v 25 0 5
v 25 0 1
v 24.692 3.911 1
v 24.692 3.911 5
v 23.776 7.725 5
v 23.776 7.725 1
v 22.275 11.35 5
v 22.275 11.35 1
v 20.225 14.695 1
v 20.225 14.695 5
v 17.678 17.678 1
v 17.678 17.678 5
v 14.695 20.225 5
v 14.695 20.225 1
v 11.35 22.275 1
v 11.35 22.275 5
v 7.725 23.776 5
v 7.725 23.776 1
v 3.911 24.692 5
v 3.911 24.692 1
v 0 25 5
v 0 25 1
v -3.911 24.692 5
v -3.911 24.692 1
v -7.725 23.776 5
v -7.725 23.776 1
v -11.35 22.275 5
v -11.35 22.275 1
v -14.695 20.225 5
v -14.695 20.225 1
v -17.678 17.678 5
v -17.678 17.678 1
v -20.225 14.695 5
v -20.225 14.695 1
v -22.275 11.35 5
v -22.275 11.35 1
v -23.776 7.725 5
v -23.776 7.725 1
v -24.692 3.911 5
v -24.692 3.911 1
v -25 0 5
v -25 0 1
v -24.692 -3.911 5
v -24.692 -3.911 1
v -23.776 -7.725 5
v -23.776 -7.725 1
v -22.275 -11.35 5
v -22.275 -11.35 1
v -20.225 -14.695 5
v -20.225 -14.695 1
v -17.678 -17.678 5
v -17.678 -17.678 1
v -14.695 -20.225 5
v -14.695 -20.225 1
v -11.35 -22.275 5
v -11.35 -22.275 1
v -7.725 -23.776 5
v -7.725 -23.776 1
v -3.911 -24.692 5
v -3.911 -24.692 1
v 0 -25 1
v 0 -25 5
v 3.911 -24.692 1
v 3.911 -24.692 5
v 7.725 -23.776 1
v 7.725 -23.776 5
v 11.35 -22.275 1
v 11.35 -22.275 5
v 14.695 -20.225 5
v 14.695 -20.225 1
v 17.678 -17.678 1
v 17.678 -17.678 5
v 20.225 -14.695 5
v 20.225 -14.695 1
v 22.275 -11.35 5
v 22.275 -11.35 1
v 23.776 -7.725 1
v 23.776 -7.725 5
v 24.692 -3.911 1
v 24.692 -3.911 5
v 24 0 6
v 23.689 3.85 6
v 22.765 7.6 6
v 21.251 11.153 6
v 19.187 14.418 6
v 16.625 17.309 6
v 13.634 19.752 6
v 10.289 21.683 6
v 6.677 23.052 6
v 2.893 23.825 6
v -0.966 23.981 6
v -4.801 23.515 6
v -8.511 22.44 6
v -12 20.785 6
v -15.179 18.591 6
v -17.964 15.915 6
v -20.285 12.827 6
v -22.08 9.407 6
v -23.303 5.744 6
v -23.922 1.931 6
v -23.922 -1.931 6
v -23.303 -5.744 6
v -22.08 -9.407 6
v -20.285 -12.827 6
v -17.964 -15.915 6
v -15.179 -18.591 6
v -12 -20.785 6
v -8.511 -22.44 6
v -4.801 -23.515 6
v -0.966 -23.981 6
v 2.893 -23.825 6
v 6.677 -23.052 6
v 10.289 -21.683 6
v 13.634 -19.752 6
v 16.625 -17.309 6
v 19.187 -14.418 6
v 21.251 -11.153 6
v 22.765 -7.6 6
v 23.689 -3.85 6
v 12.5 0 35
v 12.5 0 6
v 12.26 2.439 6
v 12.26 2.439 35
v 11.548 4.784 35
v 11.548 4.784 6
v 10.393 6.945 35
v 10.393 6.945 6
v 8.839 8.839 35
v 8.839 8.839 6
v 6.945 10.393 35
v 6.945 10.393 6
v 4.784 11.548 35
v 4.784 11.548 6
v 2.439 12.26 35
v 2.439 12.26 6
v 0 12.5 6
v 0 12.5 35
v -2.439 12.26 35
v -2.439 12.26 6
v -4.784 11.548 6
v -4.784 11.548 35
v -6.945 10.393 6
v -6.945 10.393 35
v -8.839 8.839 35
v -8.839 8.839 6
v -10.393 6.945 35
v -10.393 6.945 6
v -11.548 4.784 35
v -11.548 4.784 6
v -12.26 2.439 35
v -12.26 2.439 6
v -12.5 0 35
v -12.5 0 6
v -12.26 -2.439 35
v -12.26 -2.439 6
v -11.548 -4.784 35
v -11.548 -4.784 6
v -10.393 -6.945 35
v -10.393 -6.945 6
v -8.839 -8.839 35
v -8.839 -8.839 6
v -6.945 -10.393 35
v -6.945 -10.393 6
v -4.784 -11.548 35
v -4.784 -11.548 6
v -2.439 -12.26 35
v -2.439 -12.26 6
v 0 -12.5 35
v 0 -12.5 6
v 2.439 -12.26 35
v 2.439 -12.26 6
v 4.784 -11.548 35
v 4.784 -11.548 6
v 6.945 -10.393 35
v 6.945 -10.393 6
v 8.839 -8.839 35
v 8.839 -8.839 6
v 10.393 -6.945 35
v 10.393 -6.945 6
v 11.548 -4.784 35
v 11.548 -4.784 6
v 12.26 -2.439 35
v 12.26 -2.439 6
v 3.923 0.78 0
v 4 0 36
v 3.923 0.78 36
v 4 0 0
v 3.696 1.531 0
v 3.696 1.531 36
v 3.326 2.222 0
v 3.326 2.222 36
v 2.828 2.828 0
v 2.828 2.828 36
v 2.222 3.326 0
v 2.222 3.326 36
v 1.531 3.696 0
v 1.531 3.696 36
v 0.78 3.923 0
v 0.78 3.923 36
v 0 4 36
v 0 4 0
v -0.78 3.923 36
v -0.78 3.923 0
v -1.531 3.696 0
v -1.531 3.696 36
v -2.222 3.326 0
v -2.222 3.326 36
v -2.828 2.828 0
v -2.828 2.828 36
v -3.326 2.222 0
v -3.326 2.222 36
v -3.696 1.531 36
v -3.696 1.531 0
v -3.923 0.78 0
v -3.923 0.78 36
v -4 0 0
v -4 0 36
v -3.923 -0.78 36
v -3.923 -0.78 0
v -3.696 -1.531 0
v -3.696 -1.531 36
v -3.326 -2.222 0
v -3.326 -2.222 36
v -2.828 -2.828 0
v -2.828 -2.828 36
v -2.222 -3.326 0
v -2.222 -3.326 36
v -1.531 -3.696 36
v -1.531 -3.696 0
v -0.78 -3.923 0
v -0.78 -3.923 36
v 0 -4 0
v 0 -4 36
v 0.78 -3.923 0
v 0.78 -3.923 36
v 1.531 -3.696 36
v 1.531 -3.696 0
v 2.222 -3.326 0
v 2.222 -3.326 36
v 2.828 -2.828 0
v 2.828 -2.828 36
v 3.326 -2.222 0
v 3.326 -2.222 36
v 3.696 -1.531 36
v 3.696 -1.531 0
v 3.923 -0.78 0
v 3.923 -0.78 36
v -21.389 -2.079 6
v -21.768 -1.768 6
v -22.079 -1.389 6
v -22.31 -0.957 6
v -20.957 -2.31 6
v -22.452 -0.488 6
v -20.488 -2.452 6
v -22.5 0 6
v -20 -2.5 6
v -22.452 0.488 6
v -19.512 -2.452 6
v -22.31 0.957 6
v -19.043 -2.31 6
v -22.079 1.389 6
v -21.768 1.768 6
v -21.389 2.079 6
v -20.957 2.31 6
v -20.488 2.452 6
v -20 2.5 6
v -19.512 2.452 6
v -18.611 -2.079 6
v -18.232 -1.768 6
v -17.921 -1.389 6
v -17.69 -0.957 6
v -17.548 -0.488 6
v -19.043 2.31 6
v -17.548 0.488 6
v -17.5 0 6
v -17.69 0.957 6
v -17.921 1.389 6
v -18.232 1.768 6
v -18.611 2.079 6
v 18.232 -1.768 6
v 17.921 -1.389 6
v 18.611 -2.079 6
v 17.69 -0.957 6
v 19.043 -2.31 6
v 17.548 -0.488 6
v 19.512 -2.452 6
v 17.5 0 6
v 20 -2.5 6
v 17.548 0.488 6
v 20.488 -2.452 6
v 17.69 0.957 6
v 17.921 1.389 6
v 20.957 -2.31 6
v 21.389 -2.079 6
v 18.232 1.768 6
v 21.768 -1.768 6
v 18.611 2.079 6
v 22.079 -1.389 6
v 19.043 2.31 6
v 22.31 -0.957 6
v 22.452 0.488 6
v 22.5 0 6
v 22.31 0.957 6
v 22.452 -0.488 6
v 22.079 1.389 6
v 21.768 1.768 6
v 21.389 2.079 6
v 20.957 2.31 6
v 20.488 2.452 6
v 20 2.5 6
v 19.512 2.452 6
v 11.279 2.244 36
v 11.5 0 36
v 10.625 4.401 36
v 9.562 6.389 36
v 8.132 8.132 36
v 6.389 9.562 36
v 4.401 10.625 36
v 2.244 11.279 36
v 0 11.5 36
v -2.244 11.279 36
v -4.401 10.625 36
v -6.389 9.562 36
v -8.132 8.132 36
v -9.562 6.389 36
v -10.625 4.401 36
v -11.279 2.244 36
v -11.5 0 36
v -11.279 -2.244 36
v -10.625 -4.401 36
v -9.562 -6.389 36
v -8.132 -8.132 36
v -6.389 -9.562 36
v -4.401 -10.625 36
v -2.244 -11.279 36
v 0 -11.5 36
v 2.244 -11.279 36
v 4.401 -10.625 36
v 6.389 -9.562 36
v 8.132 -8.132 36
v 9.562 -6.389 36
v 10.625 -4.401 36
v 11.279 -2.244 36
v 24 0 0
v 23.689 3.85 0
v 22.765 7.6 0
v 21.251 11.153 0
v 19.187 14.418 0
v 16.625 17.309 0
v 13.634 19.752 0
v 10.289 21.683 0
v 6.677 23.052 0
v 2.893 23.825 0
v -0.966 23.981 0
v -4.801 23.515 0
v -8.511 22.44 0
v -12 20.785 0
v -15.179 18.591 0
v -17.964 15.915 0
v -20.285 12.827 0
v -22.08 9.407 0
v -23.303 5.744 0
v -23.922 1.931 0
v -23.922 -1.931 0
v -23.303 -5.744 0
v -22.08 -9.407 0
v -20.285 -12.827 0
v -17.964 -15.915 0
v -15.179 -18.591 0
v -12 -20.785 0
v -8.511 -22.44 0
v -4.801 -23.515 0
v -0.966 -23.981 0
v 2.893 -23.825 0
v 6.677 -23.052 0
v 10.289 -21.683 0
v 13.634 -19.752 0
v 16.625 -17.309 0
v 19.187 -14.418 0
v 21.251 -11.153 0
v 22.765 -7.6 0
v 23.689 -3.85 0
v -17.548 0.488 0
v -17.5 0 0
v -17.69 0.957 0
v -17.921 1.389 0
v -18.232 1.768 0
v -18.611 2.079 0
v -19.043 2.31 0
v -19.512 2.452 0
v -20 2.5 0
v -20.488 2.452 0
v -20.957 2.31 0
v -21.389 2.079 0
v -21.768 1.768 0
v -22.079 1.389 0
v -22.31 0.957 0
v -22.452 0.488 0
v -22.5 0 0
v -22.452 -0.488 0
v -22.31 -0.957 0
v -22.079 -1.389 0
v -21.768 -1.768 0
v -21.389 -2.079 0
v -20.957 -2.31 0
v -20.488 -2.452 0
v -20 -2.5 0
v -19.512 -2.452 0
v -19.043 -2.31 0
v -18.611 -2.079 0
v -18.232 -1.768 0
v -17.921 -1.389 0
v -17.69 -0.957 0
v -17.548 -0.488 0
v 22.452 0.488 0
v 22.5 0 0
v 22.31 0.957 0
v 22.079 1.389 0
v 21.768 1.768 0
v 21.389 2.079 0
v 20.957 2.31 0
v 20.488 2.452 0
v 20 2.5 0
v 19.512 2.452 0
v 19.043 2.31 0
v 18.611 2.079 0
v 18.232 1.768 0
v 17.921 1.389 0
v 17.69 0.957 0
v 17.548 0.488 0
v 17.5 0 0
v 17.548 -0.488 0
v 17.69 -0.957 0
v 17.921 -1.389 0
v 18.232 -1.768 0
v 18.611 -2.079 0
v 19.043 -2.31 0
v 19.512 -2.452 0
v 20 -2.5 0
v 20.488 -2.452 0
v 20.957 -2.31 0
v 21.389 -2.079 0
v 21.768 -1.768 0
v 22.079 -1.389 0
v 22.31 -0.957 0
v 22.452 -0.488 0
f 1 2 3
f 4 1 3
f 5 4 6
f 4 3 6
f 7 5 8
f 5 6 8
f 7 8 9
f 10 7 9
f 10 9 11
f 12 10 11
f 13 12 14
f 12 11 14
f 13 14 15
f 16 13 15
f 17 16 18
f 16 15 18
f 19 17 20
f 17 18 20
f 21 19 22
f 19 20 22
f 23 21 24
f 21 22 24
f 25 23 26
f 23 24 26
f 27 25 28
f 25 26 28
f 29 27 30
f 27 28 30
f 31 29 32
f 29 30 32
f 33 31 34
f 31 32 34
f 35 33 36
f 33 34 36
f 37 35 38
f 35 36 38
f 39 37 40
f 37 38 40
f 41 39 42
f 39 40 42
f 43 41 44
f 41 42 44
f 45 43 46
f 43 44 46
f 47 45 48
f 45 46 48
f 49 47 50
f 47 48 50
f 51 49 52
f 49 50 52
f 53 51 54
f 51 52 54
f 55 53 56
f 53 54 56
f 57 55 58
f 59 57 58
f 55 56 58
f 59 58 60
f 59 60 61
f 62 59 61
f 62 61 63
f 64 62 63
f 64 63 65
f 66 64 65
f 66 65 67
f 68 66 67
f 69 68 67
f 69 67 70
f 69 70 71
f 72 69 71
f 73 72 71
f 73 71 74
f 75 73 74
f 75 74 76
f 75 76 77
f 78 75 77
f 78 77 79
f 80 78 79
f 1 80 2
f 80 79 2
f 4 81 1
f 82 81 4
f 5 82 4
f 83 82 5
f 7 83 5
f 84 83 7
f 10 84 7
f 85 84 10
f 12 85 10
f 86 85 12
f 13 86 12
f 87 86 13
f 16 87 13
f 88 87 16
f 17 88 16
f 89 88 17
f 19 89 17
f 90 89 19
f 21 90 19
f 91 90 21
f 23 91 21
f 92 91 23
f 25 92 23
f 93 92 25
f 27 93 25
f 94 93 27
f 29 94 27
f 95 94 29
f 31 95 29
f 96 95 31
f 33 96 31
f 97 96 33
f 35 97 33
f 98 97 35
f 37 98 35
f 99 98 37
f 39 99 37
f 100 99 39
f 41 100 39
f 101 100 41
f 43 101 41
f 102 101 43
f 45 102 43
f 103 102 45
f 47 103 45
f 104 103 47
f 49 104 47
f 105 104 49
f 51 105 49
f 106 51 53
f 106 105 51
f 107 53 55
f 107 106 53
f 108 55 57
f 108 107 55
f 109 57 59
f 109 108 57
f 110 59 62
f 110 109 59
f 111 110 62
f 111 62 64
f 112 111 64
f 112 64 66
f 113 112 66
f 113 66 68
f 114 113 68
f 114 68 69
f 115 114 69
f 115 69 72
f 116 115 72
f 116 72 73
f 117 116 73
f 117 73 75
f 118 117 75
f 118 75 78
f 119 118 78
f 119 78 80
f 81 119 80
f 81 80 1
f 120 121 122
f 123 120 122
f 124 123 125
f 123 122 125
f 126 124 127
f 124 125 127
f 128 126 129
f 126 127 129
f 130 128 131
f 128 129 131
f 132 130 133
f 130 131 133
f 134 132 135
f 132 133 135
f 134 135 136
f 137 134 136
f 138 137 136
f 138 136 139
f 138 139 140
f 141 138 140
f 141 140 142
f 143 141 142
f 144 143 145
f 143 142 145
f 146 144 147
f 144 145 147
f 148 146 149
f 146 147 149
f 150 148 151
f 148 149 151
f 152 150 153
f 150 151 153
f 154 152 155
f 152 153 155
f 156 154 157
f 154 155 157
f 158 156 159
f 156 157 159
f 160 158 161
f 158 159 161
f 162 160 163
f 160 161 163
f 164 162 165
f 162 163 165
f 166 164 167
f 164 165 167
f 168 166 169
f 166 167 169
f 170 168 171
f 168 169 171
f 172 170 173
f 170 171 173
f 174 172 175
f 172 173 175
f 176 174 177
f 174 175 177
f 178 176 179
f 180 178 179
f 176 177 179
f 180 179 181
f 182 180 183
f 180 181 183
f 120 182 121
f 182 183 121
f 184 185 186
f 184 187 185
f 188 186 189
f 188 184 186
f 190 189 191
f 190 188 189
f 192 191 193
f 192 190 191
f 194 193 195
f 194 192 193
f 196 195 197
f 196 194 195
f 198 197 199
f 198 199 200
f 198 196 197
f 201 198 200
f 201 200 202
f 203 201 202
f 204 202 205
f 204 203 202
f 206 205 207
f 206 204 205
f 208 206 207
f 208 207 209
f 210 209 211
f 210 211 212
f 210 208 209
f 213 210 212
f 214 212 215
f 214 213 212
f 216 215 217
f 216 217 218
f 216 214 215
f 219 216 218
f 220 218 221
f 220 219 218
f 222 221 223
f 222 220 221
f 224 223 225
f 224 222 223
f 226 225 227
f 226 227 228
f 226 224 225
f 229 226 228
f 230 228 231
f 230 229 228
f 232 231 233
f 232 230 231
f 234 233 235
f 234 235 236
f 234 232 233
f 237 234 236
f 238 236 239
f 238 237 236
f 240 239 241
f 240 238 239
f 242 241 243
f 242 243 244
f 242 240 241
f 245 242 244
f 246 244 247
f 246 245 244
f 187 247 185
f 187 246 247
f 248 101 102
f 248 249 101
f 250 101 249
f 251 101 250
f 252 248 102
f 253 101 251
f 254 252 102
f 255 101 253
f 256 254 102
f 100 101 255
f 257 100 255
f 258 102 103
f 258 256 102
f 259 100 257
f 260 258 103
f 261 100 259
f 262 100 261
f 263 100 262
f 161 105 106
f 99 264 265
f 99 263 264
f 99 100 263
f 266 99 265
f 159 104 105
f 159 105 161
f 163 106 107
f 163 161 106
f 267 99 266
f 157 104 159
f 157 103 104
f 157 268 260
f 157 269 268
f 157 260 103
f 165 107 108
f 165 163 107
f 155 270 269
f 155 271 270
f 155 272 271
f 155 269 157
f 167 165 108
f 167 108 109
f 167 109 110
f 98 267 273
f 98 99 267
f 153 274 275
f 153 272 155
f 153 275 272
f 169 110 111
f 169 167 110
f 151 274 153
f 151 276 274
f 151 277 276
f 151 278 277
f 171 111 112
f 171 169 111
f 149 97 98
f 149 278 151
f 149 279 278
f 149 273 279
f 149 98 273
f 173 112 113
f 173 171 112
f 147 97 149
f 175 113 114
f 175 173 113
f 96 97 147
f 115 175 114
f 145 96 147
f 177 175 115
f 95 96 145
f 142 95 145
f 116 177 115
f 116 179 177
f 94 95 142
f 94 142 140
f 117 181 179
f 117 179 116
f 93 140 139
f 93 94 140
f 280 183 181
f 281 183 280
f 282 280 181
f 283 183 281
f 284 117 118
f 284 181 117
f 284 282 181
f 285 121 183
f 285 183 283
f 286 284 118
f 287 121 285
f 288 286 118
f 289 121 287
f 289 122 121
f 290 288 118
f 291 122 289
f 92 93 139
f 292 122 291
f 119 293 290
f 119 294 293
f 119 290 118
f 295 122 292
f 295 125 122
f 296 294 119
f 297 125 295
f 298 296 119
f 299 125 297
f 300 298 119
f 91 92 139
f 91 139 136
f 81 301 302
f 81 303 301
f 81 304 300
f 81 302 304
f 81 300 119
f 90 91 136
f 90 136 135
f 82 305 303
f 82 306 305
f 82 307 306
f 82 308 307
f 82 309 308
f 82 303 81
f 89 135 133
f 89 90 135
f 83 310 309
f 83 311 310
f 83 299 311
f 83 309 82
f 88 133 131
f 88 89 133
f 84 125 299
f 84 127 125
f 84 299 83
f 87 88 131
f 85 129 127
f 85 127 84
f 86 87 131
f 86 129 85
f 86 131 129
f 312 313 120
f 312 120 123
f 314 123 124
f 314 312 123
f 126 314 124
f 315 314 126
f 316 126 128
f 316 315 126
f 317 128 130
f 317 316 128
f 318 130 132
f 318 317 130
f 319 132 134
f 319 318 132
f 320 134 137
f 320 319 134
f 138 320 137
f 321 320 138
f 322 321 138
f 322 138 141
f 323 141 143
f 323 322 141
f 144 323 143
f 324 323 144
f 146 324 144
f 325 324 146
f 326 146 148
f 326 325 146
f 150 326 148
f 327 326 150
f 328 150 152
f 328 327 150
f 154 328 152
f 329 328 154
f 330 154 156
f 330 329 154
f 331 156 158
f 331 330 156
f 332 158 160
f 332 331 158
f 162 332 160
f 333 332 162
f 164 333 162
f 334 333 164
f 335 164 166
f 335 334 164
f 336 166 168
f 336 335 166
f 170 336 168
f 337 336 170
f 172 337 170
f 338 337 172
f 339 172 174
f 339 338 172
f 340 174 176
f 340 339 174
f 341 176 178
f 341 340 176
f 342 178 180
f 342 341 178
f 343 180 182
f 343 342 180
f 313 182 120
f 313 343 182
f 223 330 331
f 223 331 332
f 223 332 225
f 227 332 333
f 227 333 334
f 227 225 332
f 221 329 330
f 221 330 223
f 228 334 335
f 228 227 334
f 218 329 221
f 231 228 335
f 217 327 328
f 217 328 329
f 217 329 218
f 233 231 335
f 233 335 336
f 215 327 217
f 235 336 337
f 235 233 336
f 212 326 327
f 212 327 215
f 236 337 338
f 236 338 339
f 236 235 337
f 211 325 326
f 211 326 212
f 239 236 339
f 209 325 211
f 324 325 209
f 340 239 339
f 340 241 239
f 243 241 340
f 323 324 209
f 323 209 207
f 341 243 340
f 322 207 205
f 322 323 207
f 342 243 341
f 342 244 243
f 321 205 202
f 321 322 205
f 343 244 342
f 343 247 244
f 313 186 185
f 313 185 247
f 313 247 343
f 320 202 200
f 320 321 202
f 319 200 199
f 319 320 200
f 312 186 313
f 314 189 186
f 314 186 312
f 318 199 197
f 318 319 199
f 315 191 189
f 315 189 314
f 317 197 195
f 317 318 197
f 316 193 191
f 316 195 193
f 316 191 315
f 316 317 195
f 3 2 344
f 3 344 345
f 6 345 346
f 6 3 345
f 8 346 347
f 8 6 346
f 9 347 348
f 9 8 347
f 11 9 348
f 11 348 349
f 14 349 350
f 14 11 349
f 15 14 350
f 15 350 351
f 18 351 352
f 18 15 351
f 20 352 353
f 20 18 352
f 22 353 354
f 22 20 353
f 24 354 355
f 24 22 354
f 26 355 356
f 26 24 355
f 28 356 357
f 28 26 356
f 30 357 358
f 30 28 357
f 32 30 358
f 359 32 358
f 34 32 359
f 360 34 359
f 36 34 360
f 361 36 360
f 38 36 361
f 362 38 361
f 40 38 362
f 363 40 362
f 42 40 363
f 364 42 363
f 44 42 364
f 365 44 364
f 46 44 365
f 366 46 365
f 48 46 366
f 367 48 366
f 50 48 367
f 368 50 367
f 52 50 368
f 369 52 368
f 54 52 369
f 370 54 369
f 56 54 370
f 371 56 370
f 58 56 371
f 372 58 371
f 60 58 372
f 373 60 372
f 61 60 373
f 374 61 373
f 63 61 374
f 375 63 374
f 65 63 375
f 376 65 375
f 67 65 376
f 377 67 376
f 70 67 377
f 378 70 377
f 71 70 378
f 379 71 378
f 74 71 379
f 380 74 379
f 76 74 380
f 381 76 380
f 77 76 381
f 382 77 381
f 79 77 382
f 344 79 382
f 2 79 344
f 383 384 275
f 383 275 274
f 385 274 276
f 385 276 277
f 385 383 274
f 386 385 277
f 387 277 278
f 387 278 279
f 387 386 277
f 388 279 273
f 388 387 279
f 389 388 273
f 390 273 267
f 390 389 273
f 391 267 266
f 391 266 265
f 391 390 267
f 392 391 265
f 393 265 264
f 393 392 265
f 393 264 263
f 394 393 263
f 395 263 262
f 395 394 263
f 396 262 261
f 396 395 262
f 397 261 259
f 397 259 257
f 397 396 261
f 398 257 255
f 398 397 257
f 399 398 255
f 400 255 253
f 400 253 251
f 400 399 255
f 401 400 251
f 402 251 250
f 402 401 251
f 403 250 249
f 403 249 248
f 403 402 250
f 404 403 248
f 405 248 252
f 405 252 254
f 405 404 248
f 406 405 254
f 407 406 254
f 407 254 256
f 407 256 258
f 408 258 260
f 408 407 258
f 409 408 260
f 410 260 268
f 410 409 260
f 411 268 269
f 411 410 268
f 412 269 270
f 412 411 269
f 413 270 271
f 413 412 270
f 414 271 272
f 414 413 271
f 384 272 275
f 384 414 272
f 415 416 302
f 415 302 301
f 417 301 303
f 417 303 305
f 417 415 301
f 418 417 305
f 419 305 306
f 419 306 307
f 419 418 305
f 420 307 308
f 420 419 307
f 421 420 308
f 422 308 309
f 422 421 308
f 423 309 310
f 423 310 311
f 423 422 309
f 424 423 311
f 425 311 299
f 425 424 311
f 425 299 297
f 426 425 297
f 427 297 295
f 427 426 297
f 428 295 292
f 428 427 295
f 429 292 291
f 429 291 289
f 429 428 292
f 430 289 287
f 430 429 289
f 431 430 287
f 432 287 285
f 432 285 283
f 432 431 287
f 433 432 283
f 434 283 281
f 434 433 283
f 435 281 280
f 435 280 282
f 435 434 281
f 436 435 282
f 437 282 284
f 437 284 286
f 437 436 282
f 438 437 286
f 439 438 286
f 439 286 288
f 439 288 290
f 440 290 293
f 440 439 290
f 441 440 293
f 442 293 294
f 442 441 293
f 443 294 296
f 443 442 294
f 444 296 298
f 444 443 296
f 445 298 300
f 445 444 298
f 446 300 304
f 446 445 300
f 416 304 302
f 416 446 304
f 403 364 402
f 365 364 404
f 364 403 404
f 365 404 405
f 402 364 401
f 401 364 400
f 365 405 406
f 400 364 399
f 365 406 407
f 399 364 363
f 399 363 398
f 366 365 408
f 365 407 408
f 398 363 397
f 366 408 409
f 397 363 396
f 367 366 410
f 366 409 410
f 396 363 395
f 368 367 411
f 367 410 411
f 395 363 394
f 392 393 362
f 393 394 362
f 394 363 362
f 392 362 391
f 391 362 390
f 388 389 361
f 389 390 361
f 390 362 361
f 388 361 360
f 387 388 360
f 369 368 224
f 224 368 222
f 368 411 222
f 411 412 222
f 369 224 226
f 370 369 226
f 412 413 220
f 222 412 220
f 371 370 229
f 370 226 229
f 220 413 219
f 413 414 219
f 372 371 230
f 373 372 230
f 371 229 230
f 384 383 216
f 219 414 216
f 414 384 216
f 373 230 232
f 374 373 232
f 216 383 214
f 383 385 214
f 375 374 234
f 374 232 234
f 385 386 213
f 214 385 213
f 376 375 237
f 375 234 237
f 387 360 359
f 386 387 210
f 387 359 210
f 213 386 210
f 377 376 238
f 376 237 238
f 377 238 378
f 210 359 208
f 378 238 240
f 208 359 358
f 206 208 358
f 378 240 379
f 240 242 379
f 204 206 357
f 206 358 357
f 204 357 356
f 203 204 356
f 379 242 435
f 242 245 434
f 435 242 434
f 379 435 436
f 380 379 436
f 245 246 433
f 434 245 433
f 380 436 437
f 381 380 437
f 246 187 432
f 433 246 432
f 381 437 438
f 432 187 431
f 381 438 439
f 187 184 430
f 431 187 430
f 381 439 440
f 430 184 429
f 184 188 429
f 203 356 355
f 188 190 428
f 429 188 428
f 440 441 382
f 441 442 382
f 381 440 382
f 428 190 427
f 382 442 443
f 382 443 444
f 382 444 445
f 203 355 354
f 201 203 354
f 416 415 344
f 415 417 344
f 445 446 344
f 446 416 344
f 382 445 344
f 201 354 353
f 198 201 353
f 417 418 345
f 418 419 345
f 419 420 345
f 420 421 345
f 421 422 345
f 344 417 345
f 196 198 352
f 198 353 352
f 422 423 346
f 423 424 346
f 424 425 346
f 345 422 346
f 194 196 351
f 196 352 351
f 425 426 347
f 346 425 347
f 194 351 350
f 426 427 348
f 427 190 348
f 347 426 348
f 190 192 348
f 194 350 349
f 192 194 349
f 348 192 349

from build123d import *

# Parameters (mm, degrees)
F0_R     = 25
F0_R_2   = 2.5
F0_R_3   = 4
F1_DEPTH = 6
F2_R     = 12.5
F2_R_2   = 4
F3_DEPTH = 30
F4_SIZE  = 1


with BuildPart() as f1:
    # F0 (on Top) → F1 (new body)
    with BuildSketch(Plane.XY):
        Circle(F0_R)
        with Locations((-20, 0)):
            Circle(F0_R_2, mode=Mode.SUBTRACT)
        Circle(F0_R_3, mode=Mode.SUBTRACT)
        with Locations((20, 0)):
            Circle(F0_R_2, mode=Mode.SUBTRACT)
    extrude(amount=F1_DEPTH)

    # F2 (on face) → F3 (join)
    with BuildSketch(Plane.XY.offset(6)):
        Circle(F2_R)
        Circle(F2_R_2, mode=Mode.SUBTRACT)
    extrude(amount=F3_DEPTH)

    # F4
    f4_edges = [f1.edges().sort_by_distance(p)[0] for p in [
        (-12.5, 0, 36),
        (-25, 0, 6),
        (-25, 0, 0),
    ]]
    chamfer(f4_edges, length=F4_SIZE)


solid = f1.part
